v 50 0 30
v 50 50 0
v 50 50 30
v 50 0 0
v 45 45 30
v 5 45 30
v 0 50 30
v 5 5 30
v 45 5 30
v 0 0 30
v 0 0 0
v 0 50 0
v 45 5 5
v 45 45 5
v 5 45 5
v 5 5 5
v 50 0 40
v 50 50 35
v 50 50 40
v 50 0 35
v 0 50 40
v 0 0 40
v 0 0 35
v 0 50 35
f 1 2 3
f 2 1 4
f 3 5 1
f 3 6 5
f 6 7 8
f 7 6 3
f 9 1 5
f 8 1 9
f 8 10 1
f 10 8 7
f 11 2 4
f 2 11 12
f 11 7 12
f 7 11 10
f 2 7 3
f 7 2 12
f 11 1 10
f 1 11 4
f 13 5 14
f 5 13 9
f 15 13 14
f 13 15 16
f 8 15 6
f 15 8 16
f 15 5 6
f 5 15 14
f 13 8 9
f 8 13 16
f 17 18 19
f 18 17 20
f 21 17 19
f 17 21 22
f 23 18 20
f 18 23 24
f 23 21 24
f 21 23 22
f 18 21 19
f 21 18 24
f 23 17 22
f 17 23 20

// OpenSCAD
// Caja base
difference() {
    cube([50, 50, 30]);
    translate([5, 5, 5]) cube([40, 40, 25]);
}

// Tapa desplazada arriba
translate([0, 0, 35]) cube([50, 50, 5]);
